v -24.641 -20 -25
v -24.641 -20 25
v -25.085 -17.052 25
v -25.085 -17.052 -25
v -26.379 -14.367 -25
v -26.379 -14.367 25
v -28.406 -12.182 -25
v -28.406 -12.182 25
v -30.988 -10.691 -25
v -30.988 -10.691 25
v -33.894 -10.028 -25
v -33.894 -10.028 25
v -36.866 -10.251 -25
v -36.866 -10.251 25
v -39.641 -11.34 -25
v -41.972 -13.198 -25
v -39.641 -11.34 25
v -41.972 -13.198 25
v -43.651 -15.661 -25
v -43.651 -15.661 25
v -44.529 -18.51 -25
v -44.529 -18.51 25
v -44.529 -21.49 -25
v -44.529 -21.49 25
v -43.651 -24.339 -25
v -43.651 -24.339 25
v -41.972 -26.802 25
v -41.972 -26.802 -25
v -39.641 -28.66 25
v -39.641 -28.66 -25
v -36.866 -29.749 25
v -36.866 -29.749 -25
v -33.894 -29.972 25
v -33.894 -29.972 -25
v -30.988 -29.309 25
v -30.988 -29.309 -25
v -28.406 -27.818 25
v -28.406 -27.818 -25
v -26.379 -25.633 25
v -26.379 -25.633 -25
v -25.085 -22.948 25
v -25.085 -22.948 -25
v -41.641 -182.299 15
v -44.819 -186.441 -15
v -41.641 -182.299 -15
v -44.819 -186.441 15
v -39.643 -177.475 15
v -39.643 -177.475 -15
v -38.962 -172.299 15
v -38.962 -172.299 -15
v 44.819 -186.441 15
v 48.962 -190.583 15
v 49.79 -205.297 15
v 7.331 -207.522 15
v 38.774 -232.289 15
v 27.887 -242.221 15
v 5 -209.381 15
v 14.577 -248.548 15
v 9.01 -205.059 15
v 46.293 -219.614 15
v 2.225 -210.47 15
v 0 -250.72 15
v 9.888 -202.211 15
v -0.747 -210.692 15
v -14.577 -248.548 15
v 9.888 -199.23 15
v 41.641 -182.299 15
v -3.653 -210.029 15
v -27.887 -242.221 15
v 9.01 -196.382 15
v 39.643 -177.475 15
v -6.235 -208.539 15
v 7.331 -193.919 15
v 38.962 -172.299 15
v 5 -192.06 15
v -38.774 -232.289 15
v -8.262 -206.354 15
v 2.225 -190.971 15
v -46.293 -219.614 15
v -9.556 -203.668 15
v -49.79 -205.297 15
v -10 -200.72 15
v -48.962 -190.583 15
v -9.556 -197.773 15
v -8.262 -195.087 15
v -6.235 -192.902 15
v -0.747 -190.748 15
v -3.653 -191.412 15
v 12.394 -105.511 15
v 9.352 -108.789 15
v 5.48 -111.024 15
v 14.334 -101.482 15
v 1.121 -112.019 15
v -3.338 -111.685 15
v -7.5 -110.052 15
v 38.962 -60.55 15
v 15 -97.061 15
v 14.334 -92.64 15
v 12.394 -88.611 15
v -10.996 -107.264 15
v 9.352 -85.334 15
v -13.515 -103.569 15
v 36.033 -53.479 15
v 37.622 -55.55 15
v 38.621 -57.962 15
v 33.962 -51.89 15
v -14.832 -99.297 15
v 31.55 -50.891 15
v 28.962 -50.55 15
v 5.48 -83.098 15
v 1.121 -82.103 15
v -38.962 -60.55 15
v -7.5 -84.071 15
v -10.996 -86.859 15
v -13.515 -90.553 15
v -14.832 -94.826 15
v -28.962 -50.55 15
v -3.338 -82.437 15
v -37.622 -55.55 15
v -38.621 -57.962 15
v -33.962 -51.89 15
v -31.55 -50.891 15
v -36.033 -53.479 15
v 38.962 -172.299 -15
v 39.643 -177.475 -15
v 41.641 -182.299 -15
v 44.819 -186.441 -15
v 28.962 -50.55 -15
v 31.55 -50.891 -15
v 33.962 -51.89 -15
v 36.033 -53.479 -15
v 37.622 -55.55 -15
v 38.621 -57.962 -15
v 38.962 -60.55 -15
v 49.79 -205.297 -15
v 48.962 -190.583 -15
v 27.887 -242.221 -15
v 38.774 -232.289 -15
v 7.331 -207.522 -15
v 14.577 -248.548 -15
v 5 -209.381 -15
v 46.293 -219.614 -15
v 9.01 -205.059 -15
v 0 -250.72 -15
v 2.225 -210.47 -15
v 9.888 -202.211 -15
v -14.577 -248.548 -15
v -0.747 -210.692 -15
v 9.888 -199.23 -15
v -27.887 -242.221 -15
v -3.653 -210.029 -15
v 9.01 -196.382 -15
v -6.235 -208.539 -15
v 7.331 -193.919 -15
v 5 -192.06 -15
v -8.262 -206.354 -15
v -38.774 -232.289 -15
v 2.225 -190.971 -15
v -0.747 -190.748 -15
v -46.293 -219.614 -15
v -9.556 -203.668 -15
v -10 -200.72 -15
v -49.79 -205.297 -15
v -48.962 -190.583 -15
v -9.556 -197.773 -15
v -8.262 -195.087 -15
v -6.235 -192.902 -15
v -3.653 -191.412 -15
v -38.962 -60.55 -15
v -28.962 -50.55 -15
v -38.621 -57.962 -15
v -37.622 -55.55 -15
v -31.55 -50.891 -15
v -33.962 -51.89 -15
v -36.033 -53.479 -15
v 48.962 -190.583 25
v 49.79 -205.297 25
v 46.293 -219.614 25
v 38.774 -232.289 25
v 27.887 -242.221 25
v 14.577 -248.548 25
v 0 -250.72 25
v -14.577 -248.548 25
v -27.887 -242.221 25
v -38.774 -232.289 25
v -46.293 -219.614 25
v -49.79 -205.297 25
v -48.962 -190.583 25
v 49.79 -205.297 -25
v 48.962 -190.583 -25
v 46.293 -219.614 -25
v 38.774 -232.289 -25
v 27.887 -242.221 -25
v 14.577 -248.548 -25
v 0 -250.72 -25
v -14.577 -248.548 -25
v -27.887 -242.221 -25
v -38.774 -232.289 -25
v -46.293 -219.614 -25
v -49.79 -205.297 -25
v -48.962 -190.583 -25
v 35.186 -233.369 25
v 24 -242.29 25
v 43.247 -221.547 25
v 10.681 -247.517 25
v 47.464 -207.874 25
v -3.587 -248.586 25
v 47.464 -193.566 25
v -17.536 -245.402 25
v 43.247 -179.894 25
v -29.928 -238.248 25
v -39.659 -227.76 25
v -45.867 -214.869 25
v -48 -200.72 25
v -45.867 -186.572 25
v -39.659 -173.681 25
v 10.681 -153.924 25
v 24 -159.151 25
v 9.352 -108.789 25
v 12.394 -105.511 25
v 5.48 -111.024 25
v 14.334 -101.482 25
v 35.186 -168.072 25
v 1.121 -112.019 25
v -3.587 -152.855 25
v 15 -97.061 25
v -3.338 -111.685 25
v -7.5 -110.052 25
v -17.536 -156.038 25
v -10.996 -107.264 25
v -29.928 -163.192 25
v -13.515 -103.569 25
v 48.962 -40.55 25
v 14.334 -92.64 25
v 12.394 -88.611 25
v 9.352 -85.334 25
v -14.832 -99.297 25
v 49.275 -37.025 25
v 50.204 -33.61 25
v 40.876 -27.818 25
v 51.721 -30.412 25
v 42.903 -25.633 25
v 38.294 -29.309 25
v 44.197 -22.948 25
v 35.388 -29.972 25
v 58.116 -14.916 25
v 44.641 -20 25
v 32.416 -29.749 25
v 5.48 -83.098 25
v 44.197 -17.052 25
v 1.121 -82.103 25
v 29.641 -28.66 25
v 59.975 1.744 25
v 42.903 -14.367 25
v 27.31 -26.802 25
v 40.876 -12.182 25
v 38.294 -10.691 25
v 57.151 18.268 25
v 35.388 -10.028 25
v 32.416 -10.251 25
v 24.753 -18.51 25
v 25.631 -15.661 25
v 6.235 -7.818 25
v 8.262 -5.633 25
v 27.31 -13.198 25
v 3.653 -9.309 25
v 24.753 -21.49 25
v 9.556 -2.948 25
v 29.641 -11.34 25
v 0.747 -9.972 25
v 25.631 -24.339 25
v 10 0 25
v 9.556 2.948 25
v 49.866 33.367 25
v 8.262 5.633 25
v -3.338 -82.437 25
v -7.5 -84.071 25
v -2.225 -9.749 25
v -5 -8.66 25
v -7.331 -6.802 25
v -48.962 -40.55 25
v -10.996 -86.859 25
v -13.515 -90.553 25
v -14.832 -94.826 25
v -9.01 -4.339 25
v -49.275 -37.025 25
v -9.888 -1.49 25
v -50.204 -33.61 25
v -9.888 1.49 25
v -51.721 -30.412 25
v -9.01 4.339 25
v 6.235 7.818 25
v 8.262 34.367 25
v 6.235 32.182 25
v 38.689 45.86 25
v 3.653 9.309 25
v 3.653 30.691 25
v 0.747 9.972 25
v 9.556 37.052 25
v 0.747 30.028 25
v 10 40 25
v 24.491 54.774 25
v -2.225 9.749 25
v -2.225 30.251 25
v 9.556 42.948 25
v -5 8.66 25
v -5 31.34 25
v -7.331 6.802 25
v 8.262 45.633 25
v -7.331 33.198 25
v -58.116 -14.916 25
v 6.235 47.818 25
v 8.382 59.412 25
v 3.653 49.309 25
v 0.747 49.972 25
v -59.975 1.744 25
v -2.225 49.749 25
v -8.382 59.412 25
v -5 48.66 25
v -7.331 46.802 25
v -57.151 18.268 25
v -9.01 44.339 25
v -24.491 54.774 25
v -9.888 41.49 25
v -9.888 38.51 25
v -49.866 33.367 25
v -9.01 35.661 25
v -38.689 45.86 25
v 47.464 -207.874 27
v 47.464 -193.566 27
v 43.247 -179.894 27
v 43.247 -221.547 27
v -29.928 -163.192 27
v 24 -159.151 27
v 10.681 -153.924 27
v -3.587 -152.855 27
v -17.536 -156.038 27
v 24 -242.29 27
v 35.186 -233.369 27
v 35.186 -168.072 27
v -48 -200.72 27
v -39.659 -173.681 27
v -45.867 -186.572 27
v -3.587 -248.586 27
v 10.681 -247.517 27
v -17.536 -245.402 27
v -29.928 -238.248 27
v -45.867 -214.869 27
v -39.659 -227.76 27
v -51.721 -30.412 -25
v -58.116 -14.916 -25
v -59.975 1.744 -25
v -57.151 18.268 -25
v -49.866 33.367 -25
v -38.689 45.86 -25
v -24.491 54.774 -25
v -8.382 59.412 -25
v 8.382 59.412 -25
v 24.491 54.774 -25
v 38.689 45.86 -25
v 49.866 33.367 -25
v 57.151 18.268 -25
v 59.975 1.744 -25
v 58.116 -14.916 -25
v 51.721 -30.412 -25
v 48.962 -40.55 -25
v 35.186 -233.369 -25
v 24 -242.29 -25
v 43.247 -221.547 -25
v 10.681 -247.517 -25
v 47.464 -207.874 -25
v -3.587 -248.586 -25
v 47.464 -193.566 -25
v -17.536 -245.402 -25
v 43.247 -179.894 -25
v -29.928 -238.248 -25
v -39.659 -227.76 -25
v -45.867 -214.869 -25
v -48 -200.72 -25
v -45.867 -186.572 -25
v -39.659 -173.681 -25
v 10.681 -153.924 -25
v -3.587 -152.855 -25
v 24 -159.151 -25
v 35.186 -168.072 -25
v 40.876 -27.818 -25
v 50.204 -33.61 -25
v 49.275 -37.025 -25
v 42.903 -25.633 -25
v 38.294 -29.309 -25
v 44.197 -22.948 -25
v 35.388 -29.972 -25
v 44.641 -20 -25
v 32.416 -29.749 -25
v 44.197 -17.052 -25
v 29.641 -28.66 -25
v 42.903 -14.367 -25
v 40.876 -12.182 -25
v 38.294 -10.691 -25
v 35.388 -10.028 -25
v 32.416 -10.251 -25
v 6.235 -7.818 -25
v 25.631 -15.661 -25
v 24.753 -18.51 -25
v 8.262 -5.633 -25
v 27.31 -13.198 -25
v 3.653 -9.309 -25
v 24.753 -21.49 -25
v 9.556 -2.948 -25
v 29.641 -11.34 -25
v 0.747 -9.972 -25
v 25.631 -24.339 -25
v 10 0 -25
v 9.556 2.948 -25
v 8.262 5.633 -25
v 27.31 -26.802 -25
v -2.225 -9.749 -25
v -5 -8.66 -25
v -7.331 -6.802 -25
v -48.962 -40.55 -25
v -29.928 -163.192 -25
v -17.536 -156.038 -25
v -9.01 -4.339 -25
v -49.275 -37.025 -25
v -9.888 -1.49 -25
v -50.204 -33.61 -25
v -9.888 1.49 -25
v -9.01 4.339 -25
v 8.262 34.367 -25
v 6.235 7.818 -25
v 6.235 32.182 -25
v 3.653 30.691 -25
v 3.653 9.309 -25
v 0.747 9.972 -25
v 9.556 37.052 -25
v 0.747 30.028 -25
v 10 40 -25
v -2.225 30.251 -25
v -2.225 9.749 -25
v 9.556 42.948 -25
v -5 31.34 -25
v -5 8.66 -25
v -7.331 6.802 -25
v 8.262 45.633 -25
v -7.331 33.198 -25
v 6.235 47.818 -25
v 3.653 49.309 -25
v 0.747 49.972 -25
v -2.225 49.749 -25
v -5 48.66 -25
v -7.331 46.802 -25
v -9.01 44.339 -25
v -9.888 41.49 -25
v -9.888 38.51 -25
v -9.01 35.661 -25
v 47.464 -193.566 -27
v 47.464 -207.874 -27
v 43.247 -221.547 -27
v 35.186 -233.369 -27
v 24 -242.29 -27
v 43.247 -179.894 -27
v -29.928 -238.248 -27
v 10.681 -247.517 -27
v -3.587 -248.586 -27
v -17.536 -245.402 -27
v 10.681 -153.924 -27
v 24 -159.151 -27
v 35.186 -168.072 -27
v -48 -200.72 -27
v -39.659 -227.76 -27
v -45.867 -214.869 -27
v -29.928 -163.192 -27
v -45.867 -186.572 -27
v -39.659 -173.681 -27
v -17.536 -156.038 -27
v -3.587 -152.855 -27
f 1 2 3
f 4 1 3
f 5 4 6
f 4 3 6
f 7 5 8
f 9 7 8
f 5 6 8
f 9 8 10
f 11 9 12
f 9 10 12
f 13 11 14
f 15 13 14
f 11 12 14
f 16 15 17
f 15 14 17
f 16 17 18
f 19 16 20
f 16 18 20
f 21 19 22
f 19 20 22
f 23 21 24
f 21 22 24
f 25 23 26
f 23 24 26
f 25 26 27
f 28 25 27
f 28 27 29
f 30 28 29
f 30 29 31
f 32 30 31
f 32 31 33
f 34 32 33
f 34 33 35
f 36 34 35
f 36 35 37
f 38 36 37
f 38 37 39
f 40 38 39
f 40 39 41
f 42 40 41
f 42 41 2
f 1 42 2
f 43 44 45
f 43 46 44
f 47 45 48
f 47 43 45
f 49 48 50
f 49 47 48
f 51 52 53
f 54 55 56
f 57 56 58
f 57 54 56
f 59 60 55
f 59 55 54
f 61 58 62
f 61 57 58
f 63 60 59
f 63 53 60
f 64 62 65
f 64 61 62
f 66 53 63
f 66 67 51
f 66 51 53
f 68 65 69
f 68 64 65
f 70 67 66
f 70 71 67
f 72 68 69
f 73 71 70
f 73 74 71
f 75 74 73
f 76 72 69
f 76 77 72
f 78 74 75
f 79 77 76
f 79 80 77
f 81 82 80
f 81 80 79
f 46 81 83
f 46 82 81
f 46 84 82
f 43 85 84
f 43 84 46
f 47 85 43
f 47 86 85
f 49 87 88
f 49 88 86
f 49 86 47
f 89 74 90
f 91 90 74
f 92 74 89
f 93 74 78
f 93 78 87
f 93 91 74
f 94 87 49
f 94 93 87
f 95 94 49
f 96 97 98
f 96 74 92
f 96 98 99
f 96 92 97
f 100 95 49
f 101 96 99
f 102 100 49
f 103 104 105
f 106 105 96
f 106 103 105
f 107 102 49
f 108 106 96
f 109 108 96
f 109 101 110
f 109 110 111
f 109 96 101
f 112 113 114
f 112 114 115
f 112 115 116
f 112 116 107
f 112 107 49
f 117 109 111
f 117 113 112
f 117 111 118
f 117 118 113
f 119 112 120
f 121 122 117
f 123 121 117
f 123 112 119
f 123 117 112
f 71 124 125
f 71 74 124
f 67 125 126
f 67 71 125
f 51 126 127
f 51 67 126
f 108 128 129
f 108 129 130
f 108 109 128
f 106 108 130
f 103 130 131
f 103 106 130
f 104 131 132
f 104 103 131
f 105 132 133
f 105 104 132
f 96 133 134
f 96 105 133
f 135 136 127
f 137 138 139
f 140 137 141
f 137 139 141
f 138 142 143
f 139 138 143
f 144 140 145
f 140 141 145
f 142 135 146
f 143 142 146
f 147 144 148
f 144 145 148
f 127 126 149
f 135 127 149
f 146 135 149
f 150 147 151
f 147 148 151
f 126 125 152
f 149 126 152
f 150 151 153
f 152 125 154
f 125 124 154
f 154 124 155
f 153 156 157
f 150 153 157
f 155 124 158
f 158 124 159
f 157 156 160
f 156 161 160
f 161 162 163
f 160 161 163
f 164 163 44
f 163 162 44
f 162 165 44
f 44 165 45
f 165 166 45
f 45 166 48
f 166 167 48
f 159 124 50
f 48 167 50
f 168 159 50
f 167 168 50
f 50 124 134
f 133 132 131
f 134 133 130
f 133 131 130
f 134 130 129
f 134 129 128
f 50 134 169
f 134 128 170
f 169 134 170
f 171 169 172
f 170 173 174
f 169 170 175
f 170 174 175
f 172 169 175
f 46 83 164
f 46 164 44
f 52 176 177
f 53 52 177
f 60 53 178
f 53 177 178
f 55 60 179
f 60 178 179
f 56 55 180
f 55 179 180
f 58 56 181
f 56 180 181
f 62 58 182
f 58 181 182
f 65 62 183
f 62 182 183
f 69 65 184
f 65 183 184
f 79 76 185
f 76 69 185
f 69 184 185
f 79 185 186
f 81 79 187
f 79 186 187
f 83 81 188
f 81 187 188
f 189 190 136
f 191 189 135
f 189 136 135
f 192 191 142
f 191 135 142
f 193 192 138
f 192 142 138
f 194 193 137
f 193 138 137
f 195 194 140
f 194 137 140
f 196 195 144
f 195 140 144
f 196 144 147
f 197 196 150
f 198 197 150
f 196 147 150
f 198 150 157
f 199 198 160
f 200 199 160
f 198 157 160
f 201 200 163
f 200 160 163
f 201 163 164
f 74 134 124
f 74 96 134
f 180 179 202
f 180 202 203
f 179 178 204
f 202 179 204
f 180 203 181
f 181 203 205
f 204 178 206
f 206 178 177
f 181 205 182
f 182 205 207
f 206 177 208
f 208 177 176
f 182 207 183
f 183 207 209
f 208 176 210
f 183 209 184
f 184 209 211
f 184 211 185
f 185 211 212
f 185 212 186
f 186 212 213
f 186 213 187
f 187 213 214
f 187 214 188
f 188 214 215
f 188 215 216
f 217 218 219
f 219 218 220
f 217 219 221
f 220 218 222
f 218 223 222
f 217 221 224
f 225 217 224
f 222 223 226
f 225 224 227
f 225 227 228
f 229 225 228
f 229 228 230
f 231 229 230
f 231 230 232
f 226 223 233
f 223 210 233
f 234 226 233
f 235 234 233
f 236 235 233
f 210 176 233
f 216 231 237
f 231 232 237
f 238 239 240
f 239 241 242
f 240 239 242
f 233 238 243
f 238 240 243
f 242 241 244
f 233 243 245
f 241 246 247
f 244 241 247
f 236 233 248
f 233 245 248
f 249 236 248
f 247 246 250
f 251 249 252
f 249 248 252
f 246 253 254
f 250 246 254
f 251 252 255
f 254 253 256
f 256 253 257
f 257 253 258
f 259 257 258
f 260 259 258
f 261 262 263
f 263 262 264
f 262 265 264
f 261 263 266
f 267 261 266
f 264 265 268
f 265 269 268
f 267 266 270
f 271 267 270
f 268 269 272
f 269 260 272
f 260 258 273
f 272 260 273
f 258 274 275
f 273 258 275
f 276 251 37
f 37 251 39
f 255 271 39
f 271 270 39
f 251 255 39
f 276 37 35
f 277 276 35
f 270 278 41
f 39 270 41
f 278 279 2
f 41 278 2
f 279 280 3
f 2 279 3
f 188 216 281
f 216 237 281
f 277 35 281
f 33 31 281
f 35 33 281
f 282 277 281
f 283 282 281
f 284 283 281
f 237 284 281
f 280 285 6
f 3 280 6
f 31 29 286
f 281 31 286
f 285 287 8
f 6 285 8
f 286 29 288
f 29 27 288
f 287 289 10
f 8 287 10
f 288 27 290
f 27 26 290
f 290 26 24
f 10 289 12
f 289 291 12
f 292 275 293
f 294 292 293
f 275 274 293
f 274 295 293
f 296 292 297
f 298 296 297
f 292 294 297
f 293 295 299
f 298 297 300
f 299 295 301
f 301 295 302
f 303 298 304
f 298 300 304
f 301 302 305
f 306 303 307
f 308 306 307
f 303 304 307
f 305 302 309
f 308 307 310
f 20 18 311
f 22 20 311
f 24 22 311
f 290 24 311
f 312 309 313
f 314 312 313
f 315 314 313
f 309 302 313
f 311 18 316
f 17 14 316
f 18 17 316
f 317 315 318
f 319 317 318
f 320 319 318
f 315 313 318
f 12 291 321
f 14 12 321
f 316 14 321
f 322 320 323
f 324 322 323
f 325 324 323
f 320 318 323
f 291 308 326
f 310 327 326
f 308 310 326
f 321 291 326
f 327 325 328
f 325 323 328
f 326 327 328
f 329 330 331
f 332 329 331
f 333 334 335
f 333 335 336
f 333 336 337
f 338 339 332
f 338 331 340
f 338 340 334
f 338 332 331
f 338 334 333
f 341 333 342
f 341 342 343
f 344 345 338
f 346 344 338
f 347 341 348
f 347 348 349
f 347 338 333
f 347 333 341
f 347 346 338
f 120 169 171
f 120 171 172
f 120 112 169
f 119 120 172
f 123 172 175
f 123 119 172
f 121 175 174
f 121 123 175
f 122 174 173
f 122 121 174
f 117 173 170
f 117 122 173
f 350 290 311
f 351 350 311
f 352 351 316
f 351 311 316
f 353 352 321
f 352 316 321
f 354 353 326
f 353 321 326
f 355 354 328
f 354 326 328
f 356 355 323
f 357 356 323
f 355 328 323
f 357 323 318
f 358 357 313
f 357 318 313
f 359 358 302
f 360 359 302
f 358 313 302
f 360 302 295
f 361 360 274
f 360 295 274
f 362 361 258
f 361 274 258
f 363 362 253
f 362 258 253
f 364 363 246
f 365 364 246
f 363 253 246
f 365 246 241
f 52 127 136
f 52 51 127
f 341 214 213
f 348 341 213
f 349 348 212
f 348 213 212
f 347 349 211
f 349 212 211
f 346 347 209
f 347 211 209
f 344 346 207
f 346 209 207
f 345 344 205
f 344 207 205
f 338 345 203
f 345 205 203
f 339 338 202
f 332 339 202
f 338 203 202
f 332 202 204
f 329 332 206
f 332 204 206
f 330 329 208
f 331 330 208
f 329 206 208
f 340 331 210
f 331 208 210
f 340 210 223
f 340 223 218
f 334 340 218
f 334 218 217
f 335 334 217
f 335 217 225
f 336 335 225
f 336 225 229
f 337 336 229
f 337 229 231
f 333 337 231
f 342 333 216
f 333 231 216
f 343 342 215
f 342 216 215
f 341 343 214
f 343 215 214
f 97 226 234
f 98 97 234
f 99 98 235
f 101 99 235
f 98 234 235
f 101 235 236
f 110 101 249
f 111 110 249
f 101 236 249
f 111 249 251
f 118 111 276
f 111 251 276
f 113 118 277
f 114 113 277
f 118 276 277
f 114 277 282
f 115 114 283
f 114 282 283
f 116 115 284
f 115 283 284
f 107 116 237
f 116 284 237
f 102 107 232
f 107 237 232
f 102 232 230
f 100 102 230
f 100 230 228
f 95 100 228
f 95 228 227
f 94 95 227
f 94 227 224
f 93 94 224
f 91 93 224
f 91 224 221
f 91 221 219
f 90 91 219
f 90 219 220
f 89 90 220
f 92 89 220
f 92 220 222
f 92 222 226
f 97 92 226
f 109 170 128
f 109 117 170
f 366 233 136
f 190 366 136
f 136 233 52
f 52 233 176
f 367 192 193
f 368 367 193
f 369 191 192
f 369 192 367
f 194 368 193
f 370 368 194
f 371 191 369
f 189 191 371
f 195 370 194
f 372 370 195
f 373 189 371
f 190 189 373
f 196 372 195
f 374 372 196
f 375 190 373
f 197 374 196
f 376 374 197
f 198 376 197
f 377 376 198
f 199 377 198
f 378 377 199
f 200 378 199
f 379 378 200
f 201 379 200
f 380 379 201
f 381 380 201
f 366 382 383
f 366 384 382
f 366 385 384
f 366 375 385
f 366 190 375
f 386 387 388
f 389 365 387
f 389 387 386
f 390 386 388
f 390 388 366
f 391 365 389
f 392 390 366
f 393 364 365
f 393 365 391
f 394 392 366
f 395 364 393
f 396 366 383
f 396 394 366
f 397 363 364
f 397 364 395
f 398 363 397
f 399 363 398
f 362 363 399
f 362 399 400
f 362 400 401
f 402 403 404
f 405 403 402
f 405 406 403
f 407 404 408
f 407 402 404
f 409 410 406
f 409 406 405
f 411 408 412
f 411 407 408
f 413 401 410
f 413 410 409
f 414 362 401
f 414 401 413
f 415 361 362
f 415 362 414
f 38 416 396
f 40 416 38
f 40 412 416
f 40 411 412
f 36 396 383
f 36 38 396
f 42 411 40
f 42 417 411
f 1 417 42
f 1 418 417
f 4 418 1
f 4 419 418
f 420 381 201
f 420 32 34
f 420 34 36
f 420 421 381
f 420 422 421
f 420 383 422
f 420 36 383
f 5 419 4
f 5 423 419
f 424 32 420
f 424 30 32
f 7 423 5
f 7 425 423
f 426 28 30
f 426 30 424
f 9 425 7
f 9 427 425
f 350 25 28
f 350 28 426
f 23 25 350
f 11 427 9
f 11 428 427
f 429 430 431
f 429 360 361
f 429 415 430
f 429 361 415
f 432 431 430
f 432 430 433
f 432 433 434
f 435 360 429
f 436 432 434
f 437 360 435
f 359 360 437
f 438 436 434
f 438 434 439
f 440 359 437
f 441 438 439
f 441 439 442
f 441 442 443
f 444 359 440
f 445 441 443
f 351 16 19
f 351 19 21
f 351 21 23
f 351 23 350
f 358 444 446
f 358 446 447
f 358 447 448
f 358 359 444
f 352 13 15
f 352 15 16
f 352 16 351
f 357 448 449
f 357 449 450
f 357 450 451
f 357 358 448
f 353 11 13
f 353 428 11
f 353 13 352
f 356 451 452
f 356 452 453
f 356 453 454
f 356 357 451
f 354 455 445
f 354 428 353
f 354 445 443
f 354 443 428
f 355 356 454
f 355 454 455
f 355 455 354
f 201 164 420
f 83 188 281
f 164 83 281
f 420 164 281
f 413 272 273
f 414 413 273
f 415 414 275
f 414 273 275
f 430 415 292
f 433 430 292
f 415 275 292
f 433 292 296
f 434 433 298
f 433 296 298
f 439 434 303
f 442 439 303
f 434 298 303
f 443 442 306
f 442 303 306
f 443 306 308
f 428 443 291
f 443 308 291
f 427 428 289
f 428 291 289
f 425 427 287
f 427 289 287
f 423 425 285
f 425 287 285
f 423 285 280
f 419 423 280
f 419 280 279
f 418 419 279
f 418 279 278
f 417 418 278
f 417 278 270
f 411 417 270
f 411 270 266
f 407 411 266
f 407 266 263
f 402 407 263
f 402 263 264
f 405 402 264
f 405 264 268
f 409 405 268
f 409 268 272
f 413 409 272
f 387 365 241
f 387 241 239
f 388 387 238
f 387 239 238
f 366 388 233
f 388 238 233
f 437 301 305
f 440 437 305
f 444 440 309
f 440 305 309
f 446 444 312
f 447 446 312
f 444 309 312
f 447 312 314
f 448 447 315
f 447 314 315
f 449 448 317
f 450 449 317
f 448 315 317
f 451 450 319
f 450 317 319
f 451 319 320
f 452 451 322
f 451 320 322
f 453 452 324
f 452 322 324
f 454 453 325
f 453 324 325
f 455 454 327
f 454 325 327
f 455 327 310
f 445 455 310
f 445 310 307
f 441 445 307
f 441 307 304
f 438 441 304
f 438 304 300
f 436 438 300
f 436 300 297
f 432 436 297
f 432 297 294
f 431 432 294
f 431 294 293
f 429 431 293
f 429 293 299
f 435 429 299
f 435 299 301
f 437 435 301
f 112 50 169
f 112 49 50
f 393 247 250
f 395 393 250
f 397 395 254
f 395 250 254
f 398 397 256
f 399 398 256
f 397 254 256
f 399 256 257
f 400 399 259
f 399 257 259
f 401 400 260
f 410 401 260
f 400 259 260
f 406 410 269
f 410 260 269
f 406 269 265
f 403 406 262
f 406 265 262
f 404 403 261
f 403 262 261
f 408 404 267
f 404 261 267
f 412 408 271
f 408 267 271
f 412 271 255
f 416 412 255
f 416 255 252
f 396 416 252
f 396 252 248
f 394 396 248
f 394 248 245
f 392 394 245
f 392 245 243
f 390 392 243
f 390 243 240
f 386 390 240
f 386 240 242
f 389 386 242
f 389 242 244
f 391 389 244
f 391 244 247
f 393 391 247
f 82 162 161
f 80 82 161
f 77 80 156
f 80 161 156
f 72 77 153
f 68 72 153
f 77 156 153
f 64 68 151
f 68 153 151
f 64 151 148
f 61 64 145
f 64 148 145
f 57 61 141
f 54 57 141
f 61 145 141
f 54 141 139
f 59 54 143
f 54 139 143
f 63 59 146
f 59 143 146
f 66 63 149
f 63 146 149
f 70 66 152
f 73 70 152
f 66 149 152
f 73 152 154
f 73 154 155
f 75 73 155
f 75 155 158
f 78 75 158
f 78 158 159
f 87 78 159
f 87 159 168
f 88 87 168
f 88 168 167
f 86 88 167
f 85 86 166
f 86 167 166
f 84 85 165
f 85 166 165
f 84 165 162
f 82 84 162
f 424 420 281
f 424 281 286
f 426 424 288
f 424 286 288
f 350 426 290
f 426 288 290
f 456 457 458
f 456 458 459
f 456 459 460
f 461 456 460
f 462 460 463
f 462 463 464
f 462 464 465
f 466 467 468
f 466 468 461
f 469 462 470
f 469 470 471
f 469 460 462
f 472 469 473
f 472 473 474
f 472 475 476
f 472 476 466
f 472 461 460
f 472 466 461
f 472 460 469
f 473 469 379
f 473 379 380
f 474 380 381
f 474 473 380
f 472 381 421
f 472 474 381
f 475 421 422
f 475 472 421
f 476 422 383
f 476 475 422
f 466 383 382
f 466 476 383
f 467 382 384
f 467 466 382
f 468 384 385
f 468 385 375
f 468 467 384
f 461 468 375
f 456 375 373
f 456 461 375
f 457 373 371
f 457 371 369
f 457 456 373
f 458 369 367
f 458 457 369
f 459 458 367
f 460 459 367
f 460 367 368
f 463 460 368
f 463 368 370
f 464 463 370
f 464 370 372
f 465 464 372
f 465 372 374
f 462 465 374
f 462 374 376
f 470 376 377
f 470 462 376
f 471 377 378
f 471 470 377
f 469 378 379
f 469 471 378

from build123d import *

# Parameters (mm, degrees)
BOSS_EXTRU_1_DEPTH      = 25
ENL_V_MAT_EXTRU_6_DEPTH = 15
ESQUISSE7_R             = 10
ENL_V_MAT_EXTRU_7_DEPTH = 263.603726785
ESQUISSE8_R             = 48
BOSS_EXTRU_2_DEPTH      = 2
BOSS_EXTRU_3_START      = 2
ESQUISSE9_R             = 48
BOSS_EXTRU_3_DEPTH      = 2
ESQUISSE11_R            = 15
ENL_V_MAT_EXTRU_8_DEPTH = 20
ESQUISSE12_R            = 10
BOSS_EXTRU_4_DEPTH      = 30


with BuildPart() as part:
    # Esquisse1 → Boss.-Extru.1 (new, symmetric)
    with BuildSketch(Plane.XY):
        with BuildLine():
            Line((48.961575437, -40.549982901), (48.961575437, -190.58313224))
            ThreePointArc((48.961575437, -190.58313224), (0, -250.7203967), (-48.961575437, -190.58313224))
            Line((-48.961575437, -190.58313224), (-48.961575437, -40.549982901))
            ThreePointArc((-48.961575437, -40.549982901), (-49.663805136, -35.296787549), (-51.721181578, -30.412487176))
            ThreePointArc((-51.721181578, -30.412487176), (0, 60), (51.721181578, -30.412487176))
            ThreePointArc((51.721181578, -30.412487176), (49.663805136, -35.296787549), (48.961575437, -40.549982901))
        make_face()
    extrude(amount=BOSS_EXTRU_1_DEPTH, both=True)

    # Esquisse6 → Enlèv. mat.-Extru.6 (cut, symmetric)
    with BuildSketch(Plane.XY):
        with BuildLine():
            Line((-48.961575437, -190.58313224), (-44.819439813, -186.440996616))
            ThreePointArc((-44.819439813, -186.440996616), (-40.483984787, -179.95252964), (-38.961575437, -172.298860992))
            Line((-38.961575437, -172.298860992), (-38.961575437, -60.549982901))
            ThreePointArc((-38.961575437, -60.549982901), (-36.032643249, -53.478915089), (-28.961575437, -50.549982901))
            Line((-28.961575437, -50.549982901), (28.961575437, -50.549982901))
            ThreePointArc((28.961575437, -50.549982901), (36.032643249, -53.478915089), (38.961575437, -60.549982901))
            Line((38.961575437, -60.549982901), (38.961575437, -172.298860992))
            ThreePointArc((38.961575437, -172.298860992), (40.483984787, -179.95252964), (44.819439813, -186.440996616))
            Line((44.819439813, -186.440996616), (48.961575437, -190.58313224))
            Line((48.961575437, -190.58313224), (84.871492003, -248.547724845))
            Line((84.871492003, -248.547724845), (0, -290.851549547))
            Line((0, -290.851549547), (-95.233900293, -248.547724845))
            Line((-95.233900293, -248.547724845), (-48.961575437, -190.58313224))
        make_face()
    extrude(amount=ENL_V_MAT_EXTRU_6_DEPTH, both=True, mode=Mode.SUBTRACT)

    # Esquisse7 → Enlèv. mat.-Extru.7 (cut, through all)
    with BuildSketch(Plane.XY.offset(25)):
        Circle(ESQUISSE7_R)
        with Locations((0, 40)):
            Circle(ESQUISSE7_R)
        with Locations((34.641016151, -20)):
            Circle(ESQUISSE7_R)
        with Locations((-34.641016151, -20)):
            Circle(ESQUISSE7_R)
    extrude(amount=-ENL_V_MAT_EXTRU_7_DEPTH, mode=Mode.SUBTRACT)

    # Esquisse8 → Boss.-Extru.2 (add)
    with BuildSketch(Plane.XY.offset(25)):
        with Locations(Location((0, -200.7203967, 0), (0, 0, 180))):
            Circle(ESQUISSE8_R)
    extrude(amount=BOSS_EXTRU_2_DEPTH)

    # Esquisse9 → Boss.-Extru.3 (add)
    with BuildSketch(Plane(origin=(0, 0, -25), x_dir=(-1, 0, 0), z_dir=(0, 0, -1)).offset(BOSS_EXTRU_3_START)):
        with Locations((0, -200.7203967)):
            Circle(ESQUISSE9_R)
    extrude(amount=-BOSS_EXTRU_3_DEPTH)

    # Esquisse11 → Enlèv. mat.-Extru.8 (cut)
    with BuildSketch(Plane.XY.offset(25)):
        with Locations((0, -97.061157092)):
            Circle(ESQUISSE11_R)
    extrude(amount=-ENL_V_MAT_EXTRU_8_DEPTH, mode=Mode.SUBTRACT)

    # Esquisse12 → Boss.-Extru.4 (add)
    with BuildSketch(Plane.XY.offset(-15)):
        with Locations(Location((0, -200.7203967, 0), (0, 0, 180))):
            Circle(ESQUISSE12_R)
    extrude(amount=BOSS_EXTRU_4_DEPTH)


solid = part.part
